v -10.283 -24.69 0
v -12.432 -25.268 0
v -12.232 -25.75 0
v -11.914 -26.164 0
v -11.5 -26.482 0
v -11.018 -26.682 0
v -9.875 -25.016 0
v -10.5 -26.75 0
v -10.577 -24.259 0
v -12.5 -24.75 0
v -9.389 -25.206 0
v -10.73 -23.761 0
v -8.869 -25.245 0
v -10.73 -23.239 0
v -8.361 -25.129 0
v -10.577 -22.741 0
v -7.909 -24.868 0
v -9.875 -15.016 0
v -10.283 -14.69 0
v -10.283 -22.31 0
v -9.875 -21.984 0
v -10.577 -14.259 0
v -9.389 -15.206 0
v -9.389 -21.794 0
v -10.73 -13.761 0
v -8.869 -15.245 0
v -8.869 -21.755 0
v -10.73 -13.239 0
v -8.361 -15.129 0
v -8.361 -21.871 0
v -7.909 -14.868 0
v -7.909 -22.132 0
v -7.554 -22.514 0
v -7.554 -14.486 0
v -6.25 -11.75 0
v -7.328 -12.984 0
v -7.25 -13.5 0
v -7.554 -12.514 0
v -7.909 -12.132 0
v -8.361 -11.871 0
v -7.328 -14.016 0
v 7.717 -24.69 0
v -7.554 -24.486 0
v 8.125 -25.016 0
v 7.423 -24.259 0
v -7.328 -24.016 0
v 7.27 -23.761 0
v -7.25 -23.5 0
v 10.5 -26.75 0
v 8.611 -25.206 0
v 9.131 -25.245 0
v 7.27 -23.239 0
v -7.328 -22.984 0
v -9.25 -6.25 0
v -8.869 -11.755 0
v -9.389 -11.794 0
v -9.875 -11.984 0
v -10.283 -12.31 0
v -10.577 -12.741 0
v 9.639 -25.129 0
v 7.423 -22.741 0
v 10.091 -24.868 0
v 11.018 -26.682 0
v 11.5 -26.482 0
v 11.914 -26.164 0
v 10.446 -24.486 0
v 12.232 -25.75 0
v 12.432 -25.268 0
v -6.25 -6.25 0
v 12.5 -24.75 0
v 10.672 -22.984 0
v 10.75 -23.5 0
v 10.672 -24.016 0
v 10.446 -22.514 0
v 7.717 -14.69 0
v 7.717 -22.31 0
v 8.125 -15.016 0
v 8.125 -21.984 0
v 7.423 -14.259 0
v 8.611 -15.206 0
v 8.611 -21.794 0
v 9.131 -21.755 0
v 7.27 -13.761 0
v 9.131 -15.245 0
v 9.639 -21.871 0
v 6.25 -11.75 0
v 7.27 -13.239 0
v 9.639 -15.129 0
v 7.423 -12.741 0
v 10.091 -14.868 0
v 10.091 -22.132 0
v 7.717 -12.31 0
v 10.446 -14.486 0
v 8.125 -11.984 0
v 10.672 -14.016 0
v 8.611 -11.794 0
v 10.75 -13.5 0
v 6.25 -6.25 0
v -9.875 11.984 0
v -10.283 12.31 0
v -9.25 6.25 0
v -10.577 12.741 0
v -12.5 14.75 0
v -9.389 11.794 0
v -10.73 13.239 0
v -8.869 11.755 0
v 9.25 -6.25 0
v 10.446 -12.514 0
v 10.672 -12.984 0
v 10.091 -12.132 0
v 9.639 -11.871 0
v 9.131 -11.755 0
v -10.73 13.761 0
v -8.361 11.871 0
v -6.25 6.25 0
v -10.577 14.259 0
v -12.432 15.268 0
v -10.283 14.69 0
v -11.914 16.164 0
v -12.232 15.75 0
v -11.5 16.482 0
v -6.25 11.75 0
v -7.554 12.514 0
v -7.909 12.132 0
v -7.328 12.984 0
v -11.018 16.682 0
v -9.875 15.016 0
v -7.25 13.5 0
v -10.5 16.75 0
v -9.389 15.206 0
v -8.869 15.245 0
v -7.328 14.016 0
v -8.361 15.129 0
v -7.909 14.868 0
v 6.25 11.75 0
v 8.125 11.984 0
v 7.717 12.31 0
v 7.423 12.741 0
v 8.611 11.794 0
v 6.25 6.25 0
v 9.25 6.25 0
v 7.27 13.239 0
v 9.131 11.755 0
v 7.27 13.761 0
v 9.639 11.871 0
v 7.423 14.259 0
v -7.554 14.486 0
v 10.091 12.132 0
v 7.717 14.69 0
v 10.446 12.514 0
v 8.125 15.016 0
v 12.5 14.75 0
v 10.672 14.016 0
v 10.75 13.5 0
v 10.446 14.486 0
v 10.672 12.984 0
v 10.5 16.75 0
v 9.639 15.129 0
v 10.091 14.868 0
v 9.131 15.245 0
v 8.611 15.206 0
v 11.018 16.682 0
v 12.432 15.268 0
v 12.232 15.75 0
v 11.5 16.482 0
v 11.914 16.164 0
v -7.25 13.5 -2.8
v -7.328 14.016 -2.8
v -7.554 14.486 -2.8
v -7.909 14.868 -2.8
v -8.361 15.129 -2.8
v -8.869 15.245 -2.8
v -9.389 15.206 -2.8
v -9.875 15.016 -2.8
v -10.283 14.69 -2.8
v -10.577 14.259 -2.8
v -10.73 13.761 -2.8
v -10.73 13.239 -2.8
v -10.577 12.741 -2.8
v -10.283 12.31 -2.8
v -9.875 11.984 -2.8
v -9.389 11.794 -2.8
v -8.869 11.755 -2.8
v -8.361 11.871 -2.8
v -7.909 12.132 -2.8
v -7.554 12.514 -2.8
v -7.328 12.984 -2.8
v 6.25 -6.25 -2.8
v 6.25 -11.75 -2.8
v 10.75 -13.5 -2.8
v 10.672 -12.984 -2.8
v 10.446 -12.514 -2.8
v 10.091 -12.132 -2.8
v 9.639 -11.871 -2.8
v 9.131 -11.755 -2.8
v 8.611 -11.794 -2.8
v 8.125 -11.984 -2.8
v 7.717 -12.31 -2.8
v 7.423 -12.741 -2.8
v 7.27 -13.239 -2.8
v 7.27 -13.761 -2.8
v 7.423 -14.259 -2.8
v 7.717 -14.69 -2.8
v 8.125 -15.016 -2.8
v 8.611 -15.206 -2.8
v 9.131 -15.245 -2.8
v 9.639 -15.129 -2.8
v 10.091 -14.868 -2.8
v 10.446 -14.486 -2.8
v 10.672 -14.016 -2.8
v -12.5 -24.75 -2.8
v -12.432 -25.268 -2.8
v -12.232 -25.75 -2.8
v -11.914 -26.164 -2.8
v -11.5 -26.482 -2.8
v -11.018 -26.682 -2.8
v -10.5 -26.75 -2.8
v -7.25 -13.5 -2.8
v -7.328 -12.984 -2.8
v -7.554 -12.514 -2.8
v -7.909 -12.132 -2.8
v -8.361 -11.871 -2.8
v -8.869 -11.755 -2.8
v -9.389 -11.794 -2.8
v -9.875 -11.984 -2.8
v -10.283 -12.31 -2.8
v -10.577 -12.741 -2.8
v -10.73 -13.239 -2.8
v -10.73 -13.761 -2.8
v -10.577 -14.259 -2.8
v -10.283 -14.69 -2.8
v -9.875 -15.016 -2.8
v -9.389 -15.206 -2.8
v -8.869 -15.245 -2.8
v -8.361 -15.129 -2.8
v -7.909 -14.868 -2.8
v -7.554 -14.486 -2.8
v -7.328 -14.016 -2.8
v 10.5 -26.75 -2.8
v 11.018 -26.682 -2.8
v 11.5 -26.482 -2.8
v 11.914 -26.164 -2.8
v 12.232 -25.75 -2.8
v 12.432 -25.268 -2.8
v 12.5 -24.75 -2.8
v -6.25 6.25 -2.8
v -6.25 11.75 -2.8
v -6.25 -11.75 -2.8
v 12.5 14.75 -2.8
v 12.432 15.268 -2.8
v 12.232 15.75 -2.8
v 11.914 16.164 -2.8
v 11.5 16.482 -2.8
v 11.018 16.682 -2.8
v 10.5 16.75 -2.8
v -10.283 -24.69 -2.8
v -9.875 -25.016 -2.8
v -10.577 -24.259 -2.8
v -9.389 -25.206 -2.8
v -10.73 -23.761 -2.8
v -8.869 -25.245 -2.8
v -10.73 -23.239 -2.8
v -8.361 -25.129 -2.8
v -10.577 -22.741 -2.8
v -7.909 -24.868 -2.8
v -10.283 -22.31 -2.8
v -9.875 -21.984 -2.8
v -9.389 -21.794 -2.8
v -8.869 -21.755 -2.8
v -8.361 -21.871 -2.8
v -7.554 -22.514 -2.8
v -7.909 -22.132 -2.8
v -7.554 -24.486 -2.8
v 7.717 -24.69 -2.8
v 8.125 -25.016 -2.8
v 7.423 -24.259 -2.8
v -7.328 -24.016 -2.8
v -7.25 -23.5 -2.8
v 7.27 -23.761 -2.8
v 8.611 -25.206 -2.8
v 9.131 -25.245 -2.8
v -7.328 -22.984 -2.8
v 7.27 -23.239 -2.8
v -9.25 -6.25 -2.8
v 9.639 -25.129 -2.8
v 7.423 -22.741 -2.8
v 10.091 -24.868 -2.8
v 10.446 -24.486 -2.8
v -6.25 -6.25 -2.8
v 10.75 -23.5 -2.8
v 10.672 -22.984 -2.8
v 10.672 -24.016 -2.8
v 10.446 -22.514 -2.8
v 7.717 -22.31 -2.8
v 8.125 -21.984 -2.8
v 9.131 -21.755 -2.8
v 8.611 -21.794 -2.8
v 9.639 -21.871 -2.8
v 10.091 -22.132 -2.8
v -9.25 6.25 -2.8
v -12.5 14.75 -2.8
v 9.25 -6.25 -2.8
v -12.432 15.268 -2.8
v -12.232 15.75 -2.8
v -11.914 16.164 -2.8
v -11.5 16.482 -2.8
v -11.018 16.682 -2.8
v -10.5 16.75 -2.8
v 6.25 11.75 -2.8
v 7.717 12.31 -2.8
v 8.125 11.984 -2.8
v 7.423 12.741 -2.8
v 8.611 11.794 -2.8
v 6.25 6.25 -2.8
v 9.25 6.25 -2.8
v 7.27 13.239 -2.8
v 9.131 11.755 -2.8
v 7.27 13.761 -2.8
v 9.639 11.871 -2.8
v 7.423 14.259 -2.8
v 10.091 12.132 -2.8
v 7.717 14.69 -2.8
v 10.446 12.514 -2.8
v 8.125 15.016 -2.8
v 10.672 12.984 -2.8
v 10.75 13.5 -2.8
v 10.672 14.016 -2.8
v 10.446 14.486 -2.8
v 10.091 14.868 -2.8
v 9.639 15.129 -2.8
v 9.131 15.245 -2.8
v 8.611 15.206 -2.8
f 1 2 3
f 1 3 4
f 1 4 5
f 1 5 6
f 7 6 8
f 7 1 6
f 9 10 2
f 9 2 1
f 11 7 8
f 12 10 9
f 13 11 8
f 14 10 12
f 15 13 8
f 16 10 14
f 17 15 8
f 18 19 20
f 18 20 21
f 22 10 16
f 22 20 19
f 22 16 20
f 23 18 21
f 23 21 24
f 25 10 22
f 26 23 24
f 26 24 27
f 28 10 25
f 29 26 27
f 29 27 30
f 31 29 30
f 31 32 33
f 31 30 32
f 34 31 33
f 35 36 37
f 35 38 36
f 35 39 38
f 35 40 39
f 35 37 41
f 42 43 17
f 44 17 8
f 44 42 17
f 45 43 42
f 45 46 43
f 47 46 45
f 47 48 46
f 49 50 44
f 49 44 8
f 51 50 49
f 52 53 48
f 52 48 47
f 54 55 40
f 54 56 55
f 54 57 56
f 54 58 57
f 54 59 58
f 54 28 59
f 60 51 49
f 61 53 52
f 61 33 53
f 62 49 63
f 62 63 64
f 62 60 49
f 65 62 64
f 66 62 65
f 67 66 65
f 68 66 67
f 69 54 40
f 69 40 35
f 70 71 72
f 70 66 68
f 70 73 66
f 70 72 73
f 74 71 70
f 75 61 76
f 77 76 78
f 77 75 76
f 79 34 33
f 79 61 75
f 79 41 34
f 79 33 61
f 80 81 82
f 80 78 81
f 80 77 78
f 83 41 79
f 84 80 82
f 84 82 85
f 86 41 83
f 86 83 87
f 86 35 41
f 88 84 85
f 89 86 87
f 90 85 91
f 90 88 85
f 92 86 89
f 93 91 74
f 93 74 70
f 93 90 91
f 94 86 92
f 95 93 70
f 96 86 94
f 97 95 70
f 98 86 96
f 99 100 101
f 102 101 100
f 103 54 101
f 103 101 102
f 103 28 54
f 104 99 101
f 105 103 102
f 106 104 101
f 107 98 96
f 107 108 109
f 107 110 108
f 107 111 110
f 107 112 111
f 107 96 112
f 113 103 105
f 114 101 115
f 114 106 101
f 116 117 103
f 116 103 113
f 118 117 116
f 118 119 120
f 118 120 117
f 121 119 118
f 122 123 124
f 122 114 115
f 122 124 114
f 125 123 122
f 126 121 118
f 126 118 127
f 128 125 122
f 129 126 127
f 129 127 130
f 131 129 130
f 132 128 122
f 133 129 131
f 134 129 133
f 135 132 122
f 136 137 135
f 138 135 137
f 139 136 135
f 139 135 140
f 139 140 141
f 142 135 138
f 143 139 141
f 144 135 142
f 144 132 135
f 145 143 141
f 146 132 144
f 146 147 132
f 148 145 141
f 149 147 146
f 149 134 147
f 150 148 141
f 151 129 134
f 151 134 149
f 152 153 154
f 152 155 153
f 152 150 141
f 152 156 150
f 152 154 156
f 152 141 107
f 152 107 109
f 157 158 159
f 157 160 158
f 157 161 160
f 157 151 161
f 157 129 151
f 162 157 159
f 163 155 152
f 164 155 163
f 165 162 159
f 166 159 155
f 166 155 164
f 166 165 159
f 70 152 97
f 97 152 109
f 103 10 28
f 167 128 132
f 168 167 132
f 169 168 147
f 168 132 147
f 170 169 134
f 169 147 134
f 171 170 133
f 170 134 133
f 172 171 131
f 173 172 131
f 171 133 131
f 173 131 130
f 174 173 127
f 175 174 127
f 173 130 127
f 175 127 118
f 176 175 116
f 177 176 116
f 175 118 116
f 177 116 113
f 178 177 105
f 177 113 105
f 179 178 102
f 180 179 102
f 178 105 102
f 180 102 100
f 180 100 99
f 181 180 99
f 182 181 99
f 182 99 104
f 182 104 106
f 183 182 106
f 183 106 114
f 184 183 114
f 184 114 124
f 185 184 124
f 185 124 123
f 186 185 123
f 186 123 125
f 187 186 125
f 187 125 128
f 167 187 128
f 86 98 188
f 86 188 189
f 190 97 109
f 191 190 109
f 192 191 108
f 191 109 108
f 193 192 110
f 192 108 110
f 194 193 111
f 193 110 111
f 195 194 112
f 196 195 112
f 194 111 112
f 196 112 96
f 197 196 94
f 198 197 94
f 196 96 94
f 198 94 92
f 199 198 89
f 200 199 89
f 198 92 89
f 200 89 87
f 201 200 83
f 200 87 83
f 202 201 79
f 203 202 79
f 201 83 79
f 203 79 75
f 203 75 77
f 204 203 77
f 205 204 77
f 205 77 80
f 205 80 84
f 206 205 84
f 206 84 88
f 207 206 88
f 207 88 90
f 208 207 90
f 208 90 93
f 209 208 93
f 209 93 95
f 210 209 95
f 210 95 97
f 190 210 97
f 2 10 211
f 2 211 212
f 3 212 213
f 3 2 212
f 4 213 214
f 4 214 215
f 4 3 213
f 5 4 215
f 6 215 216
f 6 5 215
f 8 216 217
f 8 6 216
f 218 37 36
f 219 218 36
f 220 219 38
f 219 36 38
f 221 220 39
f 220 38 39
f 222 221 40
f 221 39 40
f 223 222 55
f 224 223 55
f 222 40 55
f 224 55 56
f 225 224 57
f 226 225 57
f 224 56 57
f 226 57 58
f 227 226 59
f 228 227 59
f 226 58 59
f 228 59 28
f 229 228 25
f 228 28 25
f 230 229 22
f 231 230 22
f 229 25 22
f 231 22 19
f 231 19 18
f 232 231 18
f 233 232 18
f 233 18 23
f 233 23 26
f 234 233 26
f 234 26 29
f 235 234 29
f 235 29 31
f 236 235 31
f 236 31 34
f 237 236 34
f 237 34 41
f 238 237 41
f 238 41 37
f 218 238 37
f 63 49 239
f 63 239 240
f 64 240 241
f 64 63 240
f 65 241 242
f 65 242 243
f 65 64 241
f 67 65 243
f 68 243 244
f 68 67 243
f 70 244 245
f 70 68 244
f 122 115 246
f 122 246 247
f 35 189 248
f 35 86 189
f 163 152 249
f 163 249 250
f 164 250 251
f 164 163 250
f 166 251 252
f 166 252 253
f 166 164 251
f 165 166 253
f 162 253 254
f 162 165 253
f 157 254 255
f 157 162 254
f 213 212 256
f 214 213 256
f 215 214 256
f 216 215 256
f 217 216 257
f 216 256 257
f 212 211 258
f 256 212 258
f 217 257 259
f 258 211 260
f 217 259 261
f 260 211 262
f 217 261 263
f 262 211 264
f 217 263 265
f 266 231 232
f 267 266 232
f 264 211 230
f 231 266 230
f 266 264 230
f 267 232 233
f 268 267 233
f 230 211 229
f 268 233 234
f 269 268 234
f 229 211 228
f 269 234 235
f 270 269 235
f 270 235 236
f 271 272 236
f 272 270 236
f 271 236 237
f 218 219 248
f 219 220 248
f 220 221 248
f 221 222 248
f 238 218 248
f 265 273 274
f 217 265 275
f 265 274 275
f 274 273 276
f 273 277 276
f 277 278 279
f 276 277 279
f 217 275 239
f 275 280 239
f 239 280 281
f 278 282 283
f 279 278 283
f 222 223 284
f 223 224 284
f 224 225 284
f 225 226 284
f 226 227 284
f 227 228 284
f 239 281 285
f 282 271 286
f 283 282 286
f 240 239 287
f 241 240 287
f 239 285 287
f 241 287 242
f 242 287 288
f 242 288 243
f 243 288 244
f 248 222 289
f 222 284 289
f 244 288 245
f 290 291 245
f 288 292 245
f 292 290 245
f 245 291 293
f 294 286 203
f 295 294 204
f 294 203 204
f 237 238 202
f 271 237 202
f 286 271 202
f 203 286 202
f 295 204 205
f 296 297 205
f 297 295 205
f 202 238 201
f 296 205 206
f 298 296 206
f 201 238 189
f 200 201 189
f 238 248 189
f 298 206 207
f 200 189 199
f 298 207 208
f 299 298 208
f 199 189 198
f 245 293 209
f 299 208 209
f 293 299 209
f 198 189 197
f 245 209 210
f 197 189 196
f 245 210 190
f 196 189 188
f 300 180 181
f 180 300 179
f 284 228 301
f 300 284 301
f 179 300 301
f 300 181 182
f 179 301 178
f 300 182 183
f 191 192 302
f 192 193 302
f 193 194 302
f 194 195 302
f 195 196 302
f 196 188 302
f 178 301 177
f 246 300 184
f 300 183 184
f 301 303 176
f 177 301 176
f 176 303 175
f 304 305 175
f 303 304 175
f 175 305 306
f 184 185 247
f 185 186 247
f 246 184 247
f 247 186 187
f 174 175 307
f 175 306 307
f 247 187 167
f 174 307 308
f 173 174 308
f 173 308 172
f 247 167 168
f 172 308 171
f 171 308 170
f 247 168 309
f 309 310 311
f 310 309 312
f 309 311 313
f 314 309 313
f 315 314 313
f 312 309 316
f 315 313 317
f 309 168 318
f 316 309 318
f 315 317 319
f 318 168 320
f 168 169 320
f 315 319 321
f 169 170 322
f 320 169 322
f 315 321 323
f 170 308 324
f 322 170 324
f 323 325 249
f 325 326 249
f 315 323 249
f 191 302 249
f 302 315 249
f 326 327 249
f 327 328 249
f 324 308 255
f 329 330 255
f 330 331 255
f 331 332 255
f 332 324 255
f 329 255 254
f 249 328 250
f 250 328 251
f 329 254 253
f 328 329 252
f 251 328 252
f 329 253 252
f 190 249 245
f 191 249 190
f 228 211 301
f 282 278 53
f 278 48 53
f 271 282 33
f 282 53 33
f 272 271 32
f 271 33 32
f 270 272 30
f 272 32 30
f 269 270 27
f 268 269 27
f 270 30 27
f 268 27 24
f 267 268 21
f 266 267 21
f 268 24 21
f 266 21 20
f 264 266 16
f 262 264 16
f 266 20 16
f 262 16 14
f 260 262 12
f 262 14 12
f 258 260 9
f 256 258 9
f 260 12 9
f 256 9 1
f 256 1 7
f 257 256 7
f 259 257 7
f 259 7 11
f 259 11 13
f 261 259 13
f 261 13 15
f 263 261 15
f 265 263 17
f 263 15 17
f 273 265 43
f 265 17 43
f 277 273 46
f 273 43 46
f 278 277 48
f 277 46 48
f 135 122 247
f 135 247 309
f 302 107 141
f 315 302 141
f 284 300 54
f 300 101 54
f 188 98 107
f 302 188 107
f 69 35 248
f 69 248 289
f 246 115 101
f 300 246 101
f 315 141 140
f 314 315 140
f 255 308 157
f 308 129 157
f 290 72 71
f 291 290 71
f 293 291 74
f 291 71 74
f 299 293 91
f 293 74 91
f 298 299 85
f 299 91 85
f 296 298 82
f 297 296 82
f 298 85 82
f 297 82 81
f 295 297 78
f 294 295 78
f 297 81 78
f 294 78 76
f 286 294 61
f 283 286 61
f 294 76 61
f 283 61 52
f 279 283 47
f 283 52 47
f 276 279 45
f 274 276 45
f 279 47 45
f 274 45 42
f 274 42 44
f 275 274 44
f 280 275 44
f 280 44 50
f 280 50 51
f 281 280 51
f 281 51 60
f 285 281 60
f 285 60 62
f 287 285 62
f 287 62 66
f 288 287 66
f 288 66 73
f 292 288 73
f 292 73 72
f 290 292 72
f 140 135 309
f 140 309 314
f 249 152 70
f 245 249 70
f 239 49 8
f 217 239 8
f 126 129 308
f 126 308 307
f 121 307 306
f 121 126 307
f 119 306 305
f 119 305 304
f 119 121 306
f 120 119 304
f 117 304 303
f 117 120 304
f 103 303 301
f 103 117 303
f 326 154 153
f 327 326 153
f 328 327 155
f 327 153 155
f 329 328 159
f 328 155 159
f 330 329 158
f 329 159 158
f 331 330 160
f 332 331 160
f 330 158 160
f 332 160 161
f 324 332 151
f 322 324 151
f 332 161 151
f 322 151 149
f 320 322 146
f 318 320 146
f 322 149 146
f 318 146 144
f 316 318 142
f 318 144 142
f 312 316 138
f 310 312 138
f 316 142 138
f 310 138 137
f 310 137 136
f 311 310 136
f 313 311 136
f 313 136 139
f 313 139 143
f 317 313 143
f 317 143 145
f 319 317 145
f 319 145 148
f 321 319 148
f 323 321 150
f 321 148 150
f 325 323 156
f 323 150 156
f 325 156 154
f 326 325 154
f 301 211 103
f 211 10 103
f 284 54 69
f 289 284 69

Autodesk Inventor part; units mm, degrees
ref_plane "YZ Plane" through (0, 0, 0) normal (1, 0, 0) x (0, 1, 0)
ref_plane "XZ Plane" through (0, 0, 0) normal (0, 1, 0) x (-1, 0, 0)
ref_plane "XY Plane" through (0, 0, 0) normal (0, 0, 1) x (1, 0, 0)
sketch "Sketch1" plane through (0, 0, 0) normal (0, 0, 1) x (1, 0, 0)
  line L0 (6.25, -11.75) -> (-6.25, -11.75)
  line L1 (-6.25, -11.75) -> (-6.25, 11.75)
  line L2 (-6.25, 11.75) -> (6.25, 11.75)
  line L3 (6.25, 11.75) -> (6.25, -11.75)
  line L4 (6.25, -11.75) -> (-6.25, 11.75) construction
  line L5 (-6.25, -11.75) -> (6.25, 11.75) construction
  line L6 (9.25, 6.25) -> (-9.25, 6.25)
  line L7 (-9.25, 6.25) -> (-9.25, -6.25)
  line L8 (-9.25, -6.25) -> (9.25, -6.25)
  line L9 (9.25, -6.25) -> (9.25, 6.25)
  line L10 (9.25, 6.25) -> (-9.25, -6.25) construction
  line L11 (-9.25, 6.25) -> (9.25, -6.25) construction
  line L12 (-10.5, 16.75) -> (10.5, 16.75)
  line L13 (12.5, 14.75) -> (12.5, -24.75)
  line L14 (10.5, -26.75) -> (-10.5, -26.75)
  line L15 (-12.5, -24.75) -> (-12.5, 14.75)
  line L16 (-9, -13.5) -> (9, -13.5) construction
  line L17 (9, -13.5) -> (9, -23.5) construction
  line L18 (9, -23.5) -> (-9, -23.5) construction
  line L19 (-9, -23.5) -> (-9, -13.5) construction
  circle A0 centre (-9, -23.5) radius 1.75
  circle A1 centre (-9, -13.5) radius 1.75
  circle A2 centre (9, -13.5) radius 1.75
  circle A3 centre (9, -23.5) radius 1.75
  line L20 (-9, 13.5) -> (9, 13.5) construction
  circle A4 centre (-9, 13.5) radius 1.75
  circle A5 centre (9, 13.5) radius 1.75
  arc A6 (-10.5, 16.75) -> (-12.5, 14.75) centre (-10.5, 14.75) ccw
  arc A7 (12.5, 14.75) -> (10.5, 16.75) centre (10.5, 14.75) ccw
  arc A8 (10.5, -26.75) -> (12.5, -24.75) centre (10.5, -24.75) ccw
  arc A9 (-12.5, -24.75) -> (-10.5, -26.75) centre (-10.5, -24.75) ccw
  point P0 (0, 0)
  point P1 (-12.5, 16.75)
  point P2 (12.5, 16.75)
  point P3 (-12.5, -26.75)
  point P4 (0, 16.75)
  point P5 (0, 0)
  point P6 (0, -23.5)
  point P7 (0, 0)
  dimension "d0" = 43.5
  dimension "d1" = 25
  dimension "d2" = 23.5
  dimension "d3" = 12.5
  dimension "d4" = 18.5
  dimension "d5" = 12.5
  dimension "d6" = 16.75
  dimension "d7" = 18
  dimension "d8" = 10
  dimension "d9" = 3.5
  dimension "d10" = 3.25
  dimension "d11" = 3.25
  dimension "d12" = 2
extrude "Extrusion1" add sketch "Sketch1" against normal blind 2.8
